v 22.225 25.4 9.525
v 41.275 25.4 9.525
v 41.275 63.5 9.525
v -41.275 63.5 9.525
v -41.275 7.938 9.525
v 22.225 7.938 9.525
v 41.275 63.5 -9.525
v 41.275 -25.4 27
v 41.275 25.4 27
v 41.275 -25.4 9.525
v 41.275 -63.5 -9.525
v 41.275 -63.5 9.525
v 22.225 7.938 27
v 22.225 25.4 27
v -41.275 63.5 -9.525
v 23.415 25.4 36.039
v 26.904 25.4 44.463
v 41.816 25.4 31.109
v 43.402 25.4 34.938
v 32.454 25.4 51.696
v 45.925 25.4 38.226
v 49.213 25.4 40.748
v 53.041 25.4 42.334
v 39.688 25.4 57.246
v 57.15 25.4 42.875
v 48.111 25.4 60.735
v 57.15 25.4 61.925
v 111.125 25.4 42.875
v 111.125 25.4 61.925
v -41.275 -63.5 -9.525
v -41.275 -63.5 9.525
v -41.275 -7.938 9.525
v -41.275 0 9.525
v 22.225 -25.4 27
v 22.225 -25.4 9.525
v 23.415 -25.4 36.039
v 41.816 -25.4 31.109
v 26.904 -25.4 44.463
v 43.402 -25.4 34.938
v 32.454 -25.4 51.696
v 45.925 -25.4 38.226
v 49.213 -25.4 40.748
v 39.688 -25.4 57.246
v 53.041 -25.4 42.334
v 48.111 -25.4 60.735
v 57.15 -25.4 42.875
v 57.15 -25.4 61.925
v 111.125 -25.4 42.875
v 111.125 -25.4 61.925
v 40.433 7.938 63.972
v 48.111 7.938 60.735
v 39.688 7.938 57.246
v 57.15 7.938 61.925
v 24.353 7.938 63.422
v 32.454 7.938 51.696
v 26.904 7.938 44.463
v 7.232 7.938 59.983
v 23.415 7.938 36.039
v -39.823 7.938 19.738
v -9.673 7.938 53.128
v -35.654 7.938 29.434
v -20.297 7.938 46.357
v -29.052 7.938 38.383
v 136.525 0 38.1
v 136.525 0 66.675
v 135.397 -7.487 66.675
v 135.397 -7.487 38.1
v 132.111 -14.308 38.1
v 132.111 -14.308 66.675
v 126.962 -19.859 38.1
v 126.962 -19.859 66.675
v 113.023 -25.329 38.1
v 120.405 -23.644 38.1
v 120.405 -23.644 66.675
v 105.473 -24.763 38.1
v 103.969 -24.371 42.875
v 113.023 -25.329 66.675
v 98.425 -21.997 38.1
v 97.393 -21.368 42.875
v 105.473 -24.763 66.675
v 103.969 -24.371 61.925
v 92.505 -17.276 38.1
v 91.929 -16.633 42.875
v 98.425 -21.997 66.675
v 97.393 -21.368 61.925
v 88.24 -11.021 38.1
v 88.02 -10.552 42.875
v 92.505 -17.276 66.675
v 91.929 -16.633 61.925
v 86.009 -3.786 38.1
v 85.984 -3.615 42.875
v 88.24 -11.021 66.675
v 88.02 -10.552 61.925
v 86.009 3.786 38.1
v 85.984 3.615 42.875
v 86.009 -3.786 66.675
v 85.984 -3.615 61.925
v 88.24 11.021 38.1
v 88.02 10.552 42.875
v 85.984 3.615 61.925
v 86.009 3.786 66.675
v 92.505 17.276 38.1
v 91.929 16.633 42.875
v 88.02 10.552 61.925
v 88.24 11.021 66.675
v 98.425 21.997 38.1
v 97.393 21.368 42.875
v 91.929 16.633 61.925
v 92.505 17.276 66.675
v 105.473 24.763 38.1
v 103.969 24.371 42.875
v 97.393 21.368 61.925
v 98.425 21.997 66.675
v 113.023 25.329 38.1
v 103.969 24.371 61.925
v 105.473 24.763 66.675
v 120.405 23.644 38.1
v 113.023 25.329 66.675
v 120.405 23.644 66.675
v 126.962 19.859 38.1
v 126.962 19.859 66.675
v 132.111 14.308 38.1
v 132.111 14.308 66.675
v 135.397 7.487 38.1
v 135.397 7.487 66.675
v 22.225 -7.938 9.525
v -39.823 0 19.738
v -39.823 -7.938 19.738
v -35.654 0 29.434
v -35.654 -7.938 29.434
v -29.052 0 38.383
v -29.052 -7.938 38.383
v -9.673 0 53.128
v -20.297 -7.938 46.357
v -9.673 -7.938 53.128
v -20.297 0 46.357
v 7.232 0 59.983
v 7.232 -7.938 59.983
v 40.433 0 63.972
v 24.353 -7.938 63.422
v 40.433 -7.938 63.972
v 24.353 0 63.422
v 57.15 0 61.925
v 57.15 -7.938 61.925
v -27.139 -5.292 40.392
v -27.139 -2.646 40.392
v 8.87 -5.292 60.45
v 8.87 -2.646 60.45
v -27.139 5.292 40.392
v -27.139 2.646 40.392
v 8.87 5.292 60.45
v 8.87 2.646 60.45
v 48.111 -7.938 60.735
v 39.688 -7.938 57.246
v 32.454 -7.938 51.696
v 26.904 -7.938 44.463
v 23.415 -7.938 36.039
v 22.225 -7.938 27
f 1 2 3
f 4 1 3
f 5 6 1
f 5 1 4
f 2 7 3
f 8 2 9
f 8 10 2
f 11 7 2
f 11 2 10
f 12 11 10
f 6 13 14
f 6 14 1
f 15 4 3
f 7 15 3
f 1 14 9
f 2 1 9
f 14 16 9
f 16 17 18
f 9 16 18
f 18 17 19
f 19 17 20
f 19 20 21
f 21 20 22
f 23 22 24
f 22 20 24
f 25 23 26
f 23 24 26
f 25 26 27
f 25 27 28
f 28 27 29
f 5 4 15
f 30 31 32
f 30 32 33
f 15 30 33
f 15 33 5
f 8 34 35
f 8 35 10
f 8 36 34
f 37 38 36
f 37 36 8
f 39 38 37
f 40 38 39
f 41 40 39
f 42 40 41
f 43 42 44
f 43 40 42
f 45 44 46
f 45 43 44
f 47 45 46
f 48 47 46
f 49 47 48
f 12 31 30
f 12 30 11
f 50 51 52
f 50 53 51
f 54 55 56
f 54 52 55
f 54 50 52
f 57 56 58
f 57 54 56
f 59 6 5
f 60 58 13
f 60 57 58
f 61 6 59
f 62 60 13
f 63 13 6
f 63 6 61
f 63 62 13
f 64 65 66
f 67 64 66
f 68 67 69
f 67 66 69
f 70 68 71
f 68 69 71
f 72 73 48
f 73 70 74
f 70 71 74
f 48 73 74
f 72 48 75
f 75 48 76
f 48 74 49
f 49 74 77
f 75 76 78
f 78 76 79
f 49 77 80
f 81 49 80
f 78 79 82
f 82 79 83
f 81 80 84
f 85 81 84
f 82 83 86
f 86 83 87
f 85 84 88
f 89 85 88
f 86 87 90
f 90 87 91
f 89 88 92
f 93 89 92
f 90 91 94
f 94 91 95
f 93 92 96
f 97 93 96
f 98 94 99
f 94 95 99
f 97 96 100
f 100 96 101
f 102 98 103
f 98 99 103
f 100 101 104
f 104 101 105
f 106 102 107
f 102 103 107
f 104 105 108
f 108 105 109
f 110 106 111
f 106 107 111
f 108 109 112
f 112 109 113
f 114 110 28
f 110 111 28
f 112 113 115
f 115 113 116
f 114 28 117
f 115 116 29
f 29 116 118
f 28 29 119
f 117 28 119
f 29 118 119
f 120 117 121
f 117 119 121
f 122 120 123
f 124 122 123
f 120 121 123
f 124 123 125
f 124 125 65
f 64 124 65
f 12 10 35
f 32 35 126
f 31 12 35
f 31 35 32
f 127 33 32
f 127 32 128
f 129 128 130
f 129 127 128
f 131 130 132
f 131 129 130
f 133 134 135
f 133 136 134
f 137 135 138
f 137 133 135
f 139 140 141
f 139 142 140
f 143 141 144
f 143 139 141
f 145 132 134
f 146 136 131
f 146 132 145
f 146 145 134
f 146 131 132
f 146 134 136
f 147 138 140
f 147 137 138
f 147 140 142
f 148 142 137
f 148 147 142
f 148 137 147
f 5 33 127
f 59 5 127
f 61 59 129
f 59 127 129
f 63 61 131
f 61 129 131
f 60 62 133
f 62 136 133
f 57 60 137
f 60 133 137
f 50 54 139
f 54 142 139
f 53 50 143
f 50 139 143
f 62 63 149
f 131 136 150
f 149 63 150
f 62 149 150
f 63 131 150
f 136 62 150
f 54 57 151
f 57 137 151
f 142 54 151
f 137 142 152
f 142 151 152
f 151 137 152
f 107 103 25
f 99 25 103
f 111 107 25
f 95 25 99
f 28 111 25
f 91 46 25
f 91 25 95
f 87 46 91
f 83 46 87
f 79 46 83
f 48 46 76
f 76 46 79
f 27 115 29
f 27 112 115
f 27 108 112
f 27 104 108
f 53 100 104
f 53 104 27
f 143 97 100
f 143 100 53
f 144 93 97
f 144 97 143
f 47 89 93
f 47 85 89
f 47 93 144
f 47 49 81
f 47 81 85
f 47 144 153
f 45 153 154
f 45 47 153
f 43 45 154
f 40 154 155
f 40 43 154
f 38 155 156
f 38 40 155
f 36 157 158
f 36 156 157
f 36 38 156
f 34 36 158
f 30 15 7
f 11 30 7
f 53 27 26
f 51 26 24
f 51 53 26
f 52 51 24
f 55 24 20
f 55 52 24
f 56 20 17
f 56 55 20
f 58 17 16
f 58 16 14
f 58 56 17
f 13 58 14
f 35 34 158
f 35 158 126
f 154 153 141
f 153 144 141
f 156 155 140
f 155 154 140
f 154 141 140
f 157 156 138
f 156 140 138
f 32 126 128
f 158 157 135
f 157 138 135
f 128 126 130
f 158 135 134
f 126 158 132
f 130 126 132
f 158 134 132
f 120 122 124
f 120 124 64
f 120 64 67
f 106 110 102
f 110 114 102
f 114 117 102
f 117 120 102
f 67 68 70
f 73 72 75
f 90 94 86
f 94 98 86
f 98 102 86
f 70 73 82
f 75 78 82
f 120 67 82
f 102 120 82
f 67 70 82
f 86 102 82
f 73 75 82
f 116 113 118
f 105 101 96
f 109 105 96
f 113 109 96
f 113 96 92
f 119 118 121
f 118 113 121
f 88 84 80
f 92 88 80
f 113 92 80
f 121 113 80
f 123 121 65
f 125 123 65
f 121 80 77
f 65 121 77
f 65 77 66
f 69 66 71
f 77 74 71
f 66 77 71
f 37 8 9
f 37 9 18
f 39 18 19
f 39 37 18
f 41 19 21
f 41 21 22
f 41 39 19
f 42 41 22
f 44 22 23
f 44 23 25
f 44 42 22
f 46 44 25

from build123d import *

# Parameters (mm, degrees)
F1_DEPTH = 63.5
F0_W     = 25.4
F0_H     = 19.05
F2_DEPTH = 25.4
F3_DEPTH = 7.9375


with BuildPart() as f1:
    # F0 (on Front) → F1 (new body, symmetric)
    with BuildSketch(Plane.XZ):
        Polygon((22.225, 9.525), (-41.275, 9.525), (-41.275, -9.525), (41.275, -9.525), (41.275, 9.525), align=None)
    extrude(amount=F1_DEPTH, both=True)

    # F0 (on Front) → F2 (join, symmetric)
    with BuildSketch(Plane.XZ):
        with BuildLine():
            Line((22.225, 27.0002), (22.225, 9.525))
            Line((22.225, 9.525), (41.275, 9.525))
            Line((41.275, 9.525), (41.275, 27.0002))
            ThreePointArc((41.275, 27.0002), (45.9246798487, 38.2255201513), (57.15, 42.8752))
            Line((57.15, 42.8752), (85.725, 42.8752))
            Line((85.725, 42.8752), (85.725, 61.9252))
            Line((85.725, 61.9252), (57.15, 61.9252))
            ThreePointArc((57.15, 61.9252), (32.4542956671, 51.6959043329), (22.225, 27.0002))
        make_face()
        with Locations((98.425, 52.4002)):
            Rectangle(F0_W, F0_H)
    extrude(amount=F2_DEPTH, both=True)

    # F0 (on Front) → F3 (join, symmetric)
    with BuildSketch(Plane.XZ):
        with BuildLine():
            add(Edge.make_bspline(
                [(-41.275, 9.525), (-41.2765443325, 43.204266578), (5.9362053871, 72.3337382078), (57.15, 61.9252)],
                knots=[0, 0, 0, 0, 111.5045361635, 111.5045361635, 111.5045361635, 111.5045361635], degree=3))
            Line((-41.275, 9.525), (22.225, 9.525))
            Line((22.225, 9.525), (22.225, 27.0002))
            ThreePointArc((22.225, 27.0002), (32.4542956671, 51.6959043329), (57.15, 61.9252))
        make_face()
    extrude(amount=F3_DEPTH, both=True)

    # F0 (on Front) → F4 (revolve)
    with BuildSketch(Plane.XZ):
        Polygon((111.125, 66.675), (111.125, 61.9252), (111.125, 42.8752), (111.125, 38.1), (136.525, 38.1), (136.525, 66.675), align=None)
    revolve(axis=Axis((111.125, 0, 52.3875), (0, 0, -1)))


with BuildPart() as f5_1:
    # F5: copy of F1
    add(f1.part)


with BuildPart() as f6_1:
    # F6: copy of F1
    add(f1.part.moved(Location((50.8, 50.8, 50.8))))


solid = f1.part
